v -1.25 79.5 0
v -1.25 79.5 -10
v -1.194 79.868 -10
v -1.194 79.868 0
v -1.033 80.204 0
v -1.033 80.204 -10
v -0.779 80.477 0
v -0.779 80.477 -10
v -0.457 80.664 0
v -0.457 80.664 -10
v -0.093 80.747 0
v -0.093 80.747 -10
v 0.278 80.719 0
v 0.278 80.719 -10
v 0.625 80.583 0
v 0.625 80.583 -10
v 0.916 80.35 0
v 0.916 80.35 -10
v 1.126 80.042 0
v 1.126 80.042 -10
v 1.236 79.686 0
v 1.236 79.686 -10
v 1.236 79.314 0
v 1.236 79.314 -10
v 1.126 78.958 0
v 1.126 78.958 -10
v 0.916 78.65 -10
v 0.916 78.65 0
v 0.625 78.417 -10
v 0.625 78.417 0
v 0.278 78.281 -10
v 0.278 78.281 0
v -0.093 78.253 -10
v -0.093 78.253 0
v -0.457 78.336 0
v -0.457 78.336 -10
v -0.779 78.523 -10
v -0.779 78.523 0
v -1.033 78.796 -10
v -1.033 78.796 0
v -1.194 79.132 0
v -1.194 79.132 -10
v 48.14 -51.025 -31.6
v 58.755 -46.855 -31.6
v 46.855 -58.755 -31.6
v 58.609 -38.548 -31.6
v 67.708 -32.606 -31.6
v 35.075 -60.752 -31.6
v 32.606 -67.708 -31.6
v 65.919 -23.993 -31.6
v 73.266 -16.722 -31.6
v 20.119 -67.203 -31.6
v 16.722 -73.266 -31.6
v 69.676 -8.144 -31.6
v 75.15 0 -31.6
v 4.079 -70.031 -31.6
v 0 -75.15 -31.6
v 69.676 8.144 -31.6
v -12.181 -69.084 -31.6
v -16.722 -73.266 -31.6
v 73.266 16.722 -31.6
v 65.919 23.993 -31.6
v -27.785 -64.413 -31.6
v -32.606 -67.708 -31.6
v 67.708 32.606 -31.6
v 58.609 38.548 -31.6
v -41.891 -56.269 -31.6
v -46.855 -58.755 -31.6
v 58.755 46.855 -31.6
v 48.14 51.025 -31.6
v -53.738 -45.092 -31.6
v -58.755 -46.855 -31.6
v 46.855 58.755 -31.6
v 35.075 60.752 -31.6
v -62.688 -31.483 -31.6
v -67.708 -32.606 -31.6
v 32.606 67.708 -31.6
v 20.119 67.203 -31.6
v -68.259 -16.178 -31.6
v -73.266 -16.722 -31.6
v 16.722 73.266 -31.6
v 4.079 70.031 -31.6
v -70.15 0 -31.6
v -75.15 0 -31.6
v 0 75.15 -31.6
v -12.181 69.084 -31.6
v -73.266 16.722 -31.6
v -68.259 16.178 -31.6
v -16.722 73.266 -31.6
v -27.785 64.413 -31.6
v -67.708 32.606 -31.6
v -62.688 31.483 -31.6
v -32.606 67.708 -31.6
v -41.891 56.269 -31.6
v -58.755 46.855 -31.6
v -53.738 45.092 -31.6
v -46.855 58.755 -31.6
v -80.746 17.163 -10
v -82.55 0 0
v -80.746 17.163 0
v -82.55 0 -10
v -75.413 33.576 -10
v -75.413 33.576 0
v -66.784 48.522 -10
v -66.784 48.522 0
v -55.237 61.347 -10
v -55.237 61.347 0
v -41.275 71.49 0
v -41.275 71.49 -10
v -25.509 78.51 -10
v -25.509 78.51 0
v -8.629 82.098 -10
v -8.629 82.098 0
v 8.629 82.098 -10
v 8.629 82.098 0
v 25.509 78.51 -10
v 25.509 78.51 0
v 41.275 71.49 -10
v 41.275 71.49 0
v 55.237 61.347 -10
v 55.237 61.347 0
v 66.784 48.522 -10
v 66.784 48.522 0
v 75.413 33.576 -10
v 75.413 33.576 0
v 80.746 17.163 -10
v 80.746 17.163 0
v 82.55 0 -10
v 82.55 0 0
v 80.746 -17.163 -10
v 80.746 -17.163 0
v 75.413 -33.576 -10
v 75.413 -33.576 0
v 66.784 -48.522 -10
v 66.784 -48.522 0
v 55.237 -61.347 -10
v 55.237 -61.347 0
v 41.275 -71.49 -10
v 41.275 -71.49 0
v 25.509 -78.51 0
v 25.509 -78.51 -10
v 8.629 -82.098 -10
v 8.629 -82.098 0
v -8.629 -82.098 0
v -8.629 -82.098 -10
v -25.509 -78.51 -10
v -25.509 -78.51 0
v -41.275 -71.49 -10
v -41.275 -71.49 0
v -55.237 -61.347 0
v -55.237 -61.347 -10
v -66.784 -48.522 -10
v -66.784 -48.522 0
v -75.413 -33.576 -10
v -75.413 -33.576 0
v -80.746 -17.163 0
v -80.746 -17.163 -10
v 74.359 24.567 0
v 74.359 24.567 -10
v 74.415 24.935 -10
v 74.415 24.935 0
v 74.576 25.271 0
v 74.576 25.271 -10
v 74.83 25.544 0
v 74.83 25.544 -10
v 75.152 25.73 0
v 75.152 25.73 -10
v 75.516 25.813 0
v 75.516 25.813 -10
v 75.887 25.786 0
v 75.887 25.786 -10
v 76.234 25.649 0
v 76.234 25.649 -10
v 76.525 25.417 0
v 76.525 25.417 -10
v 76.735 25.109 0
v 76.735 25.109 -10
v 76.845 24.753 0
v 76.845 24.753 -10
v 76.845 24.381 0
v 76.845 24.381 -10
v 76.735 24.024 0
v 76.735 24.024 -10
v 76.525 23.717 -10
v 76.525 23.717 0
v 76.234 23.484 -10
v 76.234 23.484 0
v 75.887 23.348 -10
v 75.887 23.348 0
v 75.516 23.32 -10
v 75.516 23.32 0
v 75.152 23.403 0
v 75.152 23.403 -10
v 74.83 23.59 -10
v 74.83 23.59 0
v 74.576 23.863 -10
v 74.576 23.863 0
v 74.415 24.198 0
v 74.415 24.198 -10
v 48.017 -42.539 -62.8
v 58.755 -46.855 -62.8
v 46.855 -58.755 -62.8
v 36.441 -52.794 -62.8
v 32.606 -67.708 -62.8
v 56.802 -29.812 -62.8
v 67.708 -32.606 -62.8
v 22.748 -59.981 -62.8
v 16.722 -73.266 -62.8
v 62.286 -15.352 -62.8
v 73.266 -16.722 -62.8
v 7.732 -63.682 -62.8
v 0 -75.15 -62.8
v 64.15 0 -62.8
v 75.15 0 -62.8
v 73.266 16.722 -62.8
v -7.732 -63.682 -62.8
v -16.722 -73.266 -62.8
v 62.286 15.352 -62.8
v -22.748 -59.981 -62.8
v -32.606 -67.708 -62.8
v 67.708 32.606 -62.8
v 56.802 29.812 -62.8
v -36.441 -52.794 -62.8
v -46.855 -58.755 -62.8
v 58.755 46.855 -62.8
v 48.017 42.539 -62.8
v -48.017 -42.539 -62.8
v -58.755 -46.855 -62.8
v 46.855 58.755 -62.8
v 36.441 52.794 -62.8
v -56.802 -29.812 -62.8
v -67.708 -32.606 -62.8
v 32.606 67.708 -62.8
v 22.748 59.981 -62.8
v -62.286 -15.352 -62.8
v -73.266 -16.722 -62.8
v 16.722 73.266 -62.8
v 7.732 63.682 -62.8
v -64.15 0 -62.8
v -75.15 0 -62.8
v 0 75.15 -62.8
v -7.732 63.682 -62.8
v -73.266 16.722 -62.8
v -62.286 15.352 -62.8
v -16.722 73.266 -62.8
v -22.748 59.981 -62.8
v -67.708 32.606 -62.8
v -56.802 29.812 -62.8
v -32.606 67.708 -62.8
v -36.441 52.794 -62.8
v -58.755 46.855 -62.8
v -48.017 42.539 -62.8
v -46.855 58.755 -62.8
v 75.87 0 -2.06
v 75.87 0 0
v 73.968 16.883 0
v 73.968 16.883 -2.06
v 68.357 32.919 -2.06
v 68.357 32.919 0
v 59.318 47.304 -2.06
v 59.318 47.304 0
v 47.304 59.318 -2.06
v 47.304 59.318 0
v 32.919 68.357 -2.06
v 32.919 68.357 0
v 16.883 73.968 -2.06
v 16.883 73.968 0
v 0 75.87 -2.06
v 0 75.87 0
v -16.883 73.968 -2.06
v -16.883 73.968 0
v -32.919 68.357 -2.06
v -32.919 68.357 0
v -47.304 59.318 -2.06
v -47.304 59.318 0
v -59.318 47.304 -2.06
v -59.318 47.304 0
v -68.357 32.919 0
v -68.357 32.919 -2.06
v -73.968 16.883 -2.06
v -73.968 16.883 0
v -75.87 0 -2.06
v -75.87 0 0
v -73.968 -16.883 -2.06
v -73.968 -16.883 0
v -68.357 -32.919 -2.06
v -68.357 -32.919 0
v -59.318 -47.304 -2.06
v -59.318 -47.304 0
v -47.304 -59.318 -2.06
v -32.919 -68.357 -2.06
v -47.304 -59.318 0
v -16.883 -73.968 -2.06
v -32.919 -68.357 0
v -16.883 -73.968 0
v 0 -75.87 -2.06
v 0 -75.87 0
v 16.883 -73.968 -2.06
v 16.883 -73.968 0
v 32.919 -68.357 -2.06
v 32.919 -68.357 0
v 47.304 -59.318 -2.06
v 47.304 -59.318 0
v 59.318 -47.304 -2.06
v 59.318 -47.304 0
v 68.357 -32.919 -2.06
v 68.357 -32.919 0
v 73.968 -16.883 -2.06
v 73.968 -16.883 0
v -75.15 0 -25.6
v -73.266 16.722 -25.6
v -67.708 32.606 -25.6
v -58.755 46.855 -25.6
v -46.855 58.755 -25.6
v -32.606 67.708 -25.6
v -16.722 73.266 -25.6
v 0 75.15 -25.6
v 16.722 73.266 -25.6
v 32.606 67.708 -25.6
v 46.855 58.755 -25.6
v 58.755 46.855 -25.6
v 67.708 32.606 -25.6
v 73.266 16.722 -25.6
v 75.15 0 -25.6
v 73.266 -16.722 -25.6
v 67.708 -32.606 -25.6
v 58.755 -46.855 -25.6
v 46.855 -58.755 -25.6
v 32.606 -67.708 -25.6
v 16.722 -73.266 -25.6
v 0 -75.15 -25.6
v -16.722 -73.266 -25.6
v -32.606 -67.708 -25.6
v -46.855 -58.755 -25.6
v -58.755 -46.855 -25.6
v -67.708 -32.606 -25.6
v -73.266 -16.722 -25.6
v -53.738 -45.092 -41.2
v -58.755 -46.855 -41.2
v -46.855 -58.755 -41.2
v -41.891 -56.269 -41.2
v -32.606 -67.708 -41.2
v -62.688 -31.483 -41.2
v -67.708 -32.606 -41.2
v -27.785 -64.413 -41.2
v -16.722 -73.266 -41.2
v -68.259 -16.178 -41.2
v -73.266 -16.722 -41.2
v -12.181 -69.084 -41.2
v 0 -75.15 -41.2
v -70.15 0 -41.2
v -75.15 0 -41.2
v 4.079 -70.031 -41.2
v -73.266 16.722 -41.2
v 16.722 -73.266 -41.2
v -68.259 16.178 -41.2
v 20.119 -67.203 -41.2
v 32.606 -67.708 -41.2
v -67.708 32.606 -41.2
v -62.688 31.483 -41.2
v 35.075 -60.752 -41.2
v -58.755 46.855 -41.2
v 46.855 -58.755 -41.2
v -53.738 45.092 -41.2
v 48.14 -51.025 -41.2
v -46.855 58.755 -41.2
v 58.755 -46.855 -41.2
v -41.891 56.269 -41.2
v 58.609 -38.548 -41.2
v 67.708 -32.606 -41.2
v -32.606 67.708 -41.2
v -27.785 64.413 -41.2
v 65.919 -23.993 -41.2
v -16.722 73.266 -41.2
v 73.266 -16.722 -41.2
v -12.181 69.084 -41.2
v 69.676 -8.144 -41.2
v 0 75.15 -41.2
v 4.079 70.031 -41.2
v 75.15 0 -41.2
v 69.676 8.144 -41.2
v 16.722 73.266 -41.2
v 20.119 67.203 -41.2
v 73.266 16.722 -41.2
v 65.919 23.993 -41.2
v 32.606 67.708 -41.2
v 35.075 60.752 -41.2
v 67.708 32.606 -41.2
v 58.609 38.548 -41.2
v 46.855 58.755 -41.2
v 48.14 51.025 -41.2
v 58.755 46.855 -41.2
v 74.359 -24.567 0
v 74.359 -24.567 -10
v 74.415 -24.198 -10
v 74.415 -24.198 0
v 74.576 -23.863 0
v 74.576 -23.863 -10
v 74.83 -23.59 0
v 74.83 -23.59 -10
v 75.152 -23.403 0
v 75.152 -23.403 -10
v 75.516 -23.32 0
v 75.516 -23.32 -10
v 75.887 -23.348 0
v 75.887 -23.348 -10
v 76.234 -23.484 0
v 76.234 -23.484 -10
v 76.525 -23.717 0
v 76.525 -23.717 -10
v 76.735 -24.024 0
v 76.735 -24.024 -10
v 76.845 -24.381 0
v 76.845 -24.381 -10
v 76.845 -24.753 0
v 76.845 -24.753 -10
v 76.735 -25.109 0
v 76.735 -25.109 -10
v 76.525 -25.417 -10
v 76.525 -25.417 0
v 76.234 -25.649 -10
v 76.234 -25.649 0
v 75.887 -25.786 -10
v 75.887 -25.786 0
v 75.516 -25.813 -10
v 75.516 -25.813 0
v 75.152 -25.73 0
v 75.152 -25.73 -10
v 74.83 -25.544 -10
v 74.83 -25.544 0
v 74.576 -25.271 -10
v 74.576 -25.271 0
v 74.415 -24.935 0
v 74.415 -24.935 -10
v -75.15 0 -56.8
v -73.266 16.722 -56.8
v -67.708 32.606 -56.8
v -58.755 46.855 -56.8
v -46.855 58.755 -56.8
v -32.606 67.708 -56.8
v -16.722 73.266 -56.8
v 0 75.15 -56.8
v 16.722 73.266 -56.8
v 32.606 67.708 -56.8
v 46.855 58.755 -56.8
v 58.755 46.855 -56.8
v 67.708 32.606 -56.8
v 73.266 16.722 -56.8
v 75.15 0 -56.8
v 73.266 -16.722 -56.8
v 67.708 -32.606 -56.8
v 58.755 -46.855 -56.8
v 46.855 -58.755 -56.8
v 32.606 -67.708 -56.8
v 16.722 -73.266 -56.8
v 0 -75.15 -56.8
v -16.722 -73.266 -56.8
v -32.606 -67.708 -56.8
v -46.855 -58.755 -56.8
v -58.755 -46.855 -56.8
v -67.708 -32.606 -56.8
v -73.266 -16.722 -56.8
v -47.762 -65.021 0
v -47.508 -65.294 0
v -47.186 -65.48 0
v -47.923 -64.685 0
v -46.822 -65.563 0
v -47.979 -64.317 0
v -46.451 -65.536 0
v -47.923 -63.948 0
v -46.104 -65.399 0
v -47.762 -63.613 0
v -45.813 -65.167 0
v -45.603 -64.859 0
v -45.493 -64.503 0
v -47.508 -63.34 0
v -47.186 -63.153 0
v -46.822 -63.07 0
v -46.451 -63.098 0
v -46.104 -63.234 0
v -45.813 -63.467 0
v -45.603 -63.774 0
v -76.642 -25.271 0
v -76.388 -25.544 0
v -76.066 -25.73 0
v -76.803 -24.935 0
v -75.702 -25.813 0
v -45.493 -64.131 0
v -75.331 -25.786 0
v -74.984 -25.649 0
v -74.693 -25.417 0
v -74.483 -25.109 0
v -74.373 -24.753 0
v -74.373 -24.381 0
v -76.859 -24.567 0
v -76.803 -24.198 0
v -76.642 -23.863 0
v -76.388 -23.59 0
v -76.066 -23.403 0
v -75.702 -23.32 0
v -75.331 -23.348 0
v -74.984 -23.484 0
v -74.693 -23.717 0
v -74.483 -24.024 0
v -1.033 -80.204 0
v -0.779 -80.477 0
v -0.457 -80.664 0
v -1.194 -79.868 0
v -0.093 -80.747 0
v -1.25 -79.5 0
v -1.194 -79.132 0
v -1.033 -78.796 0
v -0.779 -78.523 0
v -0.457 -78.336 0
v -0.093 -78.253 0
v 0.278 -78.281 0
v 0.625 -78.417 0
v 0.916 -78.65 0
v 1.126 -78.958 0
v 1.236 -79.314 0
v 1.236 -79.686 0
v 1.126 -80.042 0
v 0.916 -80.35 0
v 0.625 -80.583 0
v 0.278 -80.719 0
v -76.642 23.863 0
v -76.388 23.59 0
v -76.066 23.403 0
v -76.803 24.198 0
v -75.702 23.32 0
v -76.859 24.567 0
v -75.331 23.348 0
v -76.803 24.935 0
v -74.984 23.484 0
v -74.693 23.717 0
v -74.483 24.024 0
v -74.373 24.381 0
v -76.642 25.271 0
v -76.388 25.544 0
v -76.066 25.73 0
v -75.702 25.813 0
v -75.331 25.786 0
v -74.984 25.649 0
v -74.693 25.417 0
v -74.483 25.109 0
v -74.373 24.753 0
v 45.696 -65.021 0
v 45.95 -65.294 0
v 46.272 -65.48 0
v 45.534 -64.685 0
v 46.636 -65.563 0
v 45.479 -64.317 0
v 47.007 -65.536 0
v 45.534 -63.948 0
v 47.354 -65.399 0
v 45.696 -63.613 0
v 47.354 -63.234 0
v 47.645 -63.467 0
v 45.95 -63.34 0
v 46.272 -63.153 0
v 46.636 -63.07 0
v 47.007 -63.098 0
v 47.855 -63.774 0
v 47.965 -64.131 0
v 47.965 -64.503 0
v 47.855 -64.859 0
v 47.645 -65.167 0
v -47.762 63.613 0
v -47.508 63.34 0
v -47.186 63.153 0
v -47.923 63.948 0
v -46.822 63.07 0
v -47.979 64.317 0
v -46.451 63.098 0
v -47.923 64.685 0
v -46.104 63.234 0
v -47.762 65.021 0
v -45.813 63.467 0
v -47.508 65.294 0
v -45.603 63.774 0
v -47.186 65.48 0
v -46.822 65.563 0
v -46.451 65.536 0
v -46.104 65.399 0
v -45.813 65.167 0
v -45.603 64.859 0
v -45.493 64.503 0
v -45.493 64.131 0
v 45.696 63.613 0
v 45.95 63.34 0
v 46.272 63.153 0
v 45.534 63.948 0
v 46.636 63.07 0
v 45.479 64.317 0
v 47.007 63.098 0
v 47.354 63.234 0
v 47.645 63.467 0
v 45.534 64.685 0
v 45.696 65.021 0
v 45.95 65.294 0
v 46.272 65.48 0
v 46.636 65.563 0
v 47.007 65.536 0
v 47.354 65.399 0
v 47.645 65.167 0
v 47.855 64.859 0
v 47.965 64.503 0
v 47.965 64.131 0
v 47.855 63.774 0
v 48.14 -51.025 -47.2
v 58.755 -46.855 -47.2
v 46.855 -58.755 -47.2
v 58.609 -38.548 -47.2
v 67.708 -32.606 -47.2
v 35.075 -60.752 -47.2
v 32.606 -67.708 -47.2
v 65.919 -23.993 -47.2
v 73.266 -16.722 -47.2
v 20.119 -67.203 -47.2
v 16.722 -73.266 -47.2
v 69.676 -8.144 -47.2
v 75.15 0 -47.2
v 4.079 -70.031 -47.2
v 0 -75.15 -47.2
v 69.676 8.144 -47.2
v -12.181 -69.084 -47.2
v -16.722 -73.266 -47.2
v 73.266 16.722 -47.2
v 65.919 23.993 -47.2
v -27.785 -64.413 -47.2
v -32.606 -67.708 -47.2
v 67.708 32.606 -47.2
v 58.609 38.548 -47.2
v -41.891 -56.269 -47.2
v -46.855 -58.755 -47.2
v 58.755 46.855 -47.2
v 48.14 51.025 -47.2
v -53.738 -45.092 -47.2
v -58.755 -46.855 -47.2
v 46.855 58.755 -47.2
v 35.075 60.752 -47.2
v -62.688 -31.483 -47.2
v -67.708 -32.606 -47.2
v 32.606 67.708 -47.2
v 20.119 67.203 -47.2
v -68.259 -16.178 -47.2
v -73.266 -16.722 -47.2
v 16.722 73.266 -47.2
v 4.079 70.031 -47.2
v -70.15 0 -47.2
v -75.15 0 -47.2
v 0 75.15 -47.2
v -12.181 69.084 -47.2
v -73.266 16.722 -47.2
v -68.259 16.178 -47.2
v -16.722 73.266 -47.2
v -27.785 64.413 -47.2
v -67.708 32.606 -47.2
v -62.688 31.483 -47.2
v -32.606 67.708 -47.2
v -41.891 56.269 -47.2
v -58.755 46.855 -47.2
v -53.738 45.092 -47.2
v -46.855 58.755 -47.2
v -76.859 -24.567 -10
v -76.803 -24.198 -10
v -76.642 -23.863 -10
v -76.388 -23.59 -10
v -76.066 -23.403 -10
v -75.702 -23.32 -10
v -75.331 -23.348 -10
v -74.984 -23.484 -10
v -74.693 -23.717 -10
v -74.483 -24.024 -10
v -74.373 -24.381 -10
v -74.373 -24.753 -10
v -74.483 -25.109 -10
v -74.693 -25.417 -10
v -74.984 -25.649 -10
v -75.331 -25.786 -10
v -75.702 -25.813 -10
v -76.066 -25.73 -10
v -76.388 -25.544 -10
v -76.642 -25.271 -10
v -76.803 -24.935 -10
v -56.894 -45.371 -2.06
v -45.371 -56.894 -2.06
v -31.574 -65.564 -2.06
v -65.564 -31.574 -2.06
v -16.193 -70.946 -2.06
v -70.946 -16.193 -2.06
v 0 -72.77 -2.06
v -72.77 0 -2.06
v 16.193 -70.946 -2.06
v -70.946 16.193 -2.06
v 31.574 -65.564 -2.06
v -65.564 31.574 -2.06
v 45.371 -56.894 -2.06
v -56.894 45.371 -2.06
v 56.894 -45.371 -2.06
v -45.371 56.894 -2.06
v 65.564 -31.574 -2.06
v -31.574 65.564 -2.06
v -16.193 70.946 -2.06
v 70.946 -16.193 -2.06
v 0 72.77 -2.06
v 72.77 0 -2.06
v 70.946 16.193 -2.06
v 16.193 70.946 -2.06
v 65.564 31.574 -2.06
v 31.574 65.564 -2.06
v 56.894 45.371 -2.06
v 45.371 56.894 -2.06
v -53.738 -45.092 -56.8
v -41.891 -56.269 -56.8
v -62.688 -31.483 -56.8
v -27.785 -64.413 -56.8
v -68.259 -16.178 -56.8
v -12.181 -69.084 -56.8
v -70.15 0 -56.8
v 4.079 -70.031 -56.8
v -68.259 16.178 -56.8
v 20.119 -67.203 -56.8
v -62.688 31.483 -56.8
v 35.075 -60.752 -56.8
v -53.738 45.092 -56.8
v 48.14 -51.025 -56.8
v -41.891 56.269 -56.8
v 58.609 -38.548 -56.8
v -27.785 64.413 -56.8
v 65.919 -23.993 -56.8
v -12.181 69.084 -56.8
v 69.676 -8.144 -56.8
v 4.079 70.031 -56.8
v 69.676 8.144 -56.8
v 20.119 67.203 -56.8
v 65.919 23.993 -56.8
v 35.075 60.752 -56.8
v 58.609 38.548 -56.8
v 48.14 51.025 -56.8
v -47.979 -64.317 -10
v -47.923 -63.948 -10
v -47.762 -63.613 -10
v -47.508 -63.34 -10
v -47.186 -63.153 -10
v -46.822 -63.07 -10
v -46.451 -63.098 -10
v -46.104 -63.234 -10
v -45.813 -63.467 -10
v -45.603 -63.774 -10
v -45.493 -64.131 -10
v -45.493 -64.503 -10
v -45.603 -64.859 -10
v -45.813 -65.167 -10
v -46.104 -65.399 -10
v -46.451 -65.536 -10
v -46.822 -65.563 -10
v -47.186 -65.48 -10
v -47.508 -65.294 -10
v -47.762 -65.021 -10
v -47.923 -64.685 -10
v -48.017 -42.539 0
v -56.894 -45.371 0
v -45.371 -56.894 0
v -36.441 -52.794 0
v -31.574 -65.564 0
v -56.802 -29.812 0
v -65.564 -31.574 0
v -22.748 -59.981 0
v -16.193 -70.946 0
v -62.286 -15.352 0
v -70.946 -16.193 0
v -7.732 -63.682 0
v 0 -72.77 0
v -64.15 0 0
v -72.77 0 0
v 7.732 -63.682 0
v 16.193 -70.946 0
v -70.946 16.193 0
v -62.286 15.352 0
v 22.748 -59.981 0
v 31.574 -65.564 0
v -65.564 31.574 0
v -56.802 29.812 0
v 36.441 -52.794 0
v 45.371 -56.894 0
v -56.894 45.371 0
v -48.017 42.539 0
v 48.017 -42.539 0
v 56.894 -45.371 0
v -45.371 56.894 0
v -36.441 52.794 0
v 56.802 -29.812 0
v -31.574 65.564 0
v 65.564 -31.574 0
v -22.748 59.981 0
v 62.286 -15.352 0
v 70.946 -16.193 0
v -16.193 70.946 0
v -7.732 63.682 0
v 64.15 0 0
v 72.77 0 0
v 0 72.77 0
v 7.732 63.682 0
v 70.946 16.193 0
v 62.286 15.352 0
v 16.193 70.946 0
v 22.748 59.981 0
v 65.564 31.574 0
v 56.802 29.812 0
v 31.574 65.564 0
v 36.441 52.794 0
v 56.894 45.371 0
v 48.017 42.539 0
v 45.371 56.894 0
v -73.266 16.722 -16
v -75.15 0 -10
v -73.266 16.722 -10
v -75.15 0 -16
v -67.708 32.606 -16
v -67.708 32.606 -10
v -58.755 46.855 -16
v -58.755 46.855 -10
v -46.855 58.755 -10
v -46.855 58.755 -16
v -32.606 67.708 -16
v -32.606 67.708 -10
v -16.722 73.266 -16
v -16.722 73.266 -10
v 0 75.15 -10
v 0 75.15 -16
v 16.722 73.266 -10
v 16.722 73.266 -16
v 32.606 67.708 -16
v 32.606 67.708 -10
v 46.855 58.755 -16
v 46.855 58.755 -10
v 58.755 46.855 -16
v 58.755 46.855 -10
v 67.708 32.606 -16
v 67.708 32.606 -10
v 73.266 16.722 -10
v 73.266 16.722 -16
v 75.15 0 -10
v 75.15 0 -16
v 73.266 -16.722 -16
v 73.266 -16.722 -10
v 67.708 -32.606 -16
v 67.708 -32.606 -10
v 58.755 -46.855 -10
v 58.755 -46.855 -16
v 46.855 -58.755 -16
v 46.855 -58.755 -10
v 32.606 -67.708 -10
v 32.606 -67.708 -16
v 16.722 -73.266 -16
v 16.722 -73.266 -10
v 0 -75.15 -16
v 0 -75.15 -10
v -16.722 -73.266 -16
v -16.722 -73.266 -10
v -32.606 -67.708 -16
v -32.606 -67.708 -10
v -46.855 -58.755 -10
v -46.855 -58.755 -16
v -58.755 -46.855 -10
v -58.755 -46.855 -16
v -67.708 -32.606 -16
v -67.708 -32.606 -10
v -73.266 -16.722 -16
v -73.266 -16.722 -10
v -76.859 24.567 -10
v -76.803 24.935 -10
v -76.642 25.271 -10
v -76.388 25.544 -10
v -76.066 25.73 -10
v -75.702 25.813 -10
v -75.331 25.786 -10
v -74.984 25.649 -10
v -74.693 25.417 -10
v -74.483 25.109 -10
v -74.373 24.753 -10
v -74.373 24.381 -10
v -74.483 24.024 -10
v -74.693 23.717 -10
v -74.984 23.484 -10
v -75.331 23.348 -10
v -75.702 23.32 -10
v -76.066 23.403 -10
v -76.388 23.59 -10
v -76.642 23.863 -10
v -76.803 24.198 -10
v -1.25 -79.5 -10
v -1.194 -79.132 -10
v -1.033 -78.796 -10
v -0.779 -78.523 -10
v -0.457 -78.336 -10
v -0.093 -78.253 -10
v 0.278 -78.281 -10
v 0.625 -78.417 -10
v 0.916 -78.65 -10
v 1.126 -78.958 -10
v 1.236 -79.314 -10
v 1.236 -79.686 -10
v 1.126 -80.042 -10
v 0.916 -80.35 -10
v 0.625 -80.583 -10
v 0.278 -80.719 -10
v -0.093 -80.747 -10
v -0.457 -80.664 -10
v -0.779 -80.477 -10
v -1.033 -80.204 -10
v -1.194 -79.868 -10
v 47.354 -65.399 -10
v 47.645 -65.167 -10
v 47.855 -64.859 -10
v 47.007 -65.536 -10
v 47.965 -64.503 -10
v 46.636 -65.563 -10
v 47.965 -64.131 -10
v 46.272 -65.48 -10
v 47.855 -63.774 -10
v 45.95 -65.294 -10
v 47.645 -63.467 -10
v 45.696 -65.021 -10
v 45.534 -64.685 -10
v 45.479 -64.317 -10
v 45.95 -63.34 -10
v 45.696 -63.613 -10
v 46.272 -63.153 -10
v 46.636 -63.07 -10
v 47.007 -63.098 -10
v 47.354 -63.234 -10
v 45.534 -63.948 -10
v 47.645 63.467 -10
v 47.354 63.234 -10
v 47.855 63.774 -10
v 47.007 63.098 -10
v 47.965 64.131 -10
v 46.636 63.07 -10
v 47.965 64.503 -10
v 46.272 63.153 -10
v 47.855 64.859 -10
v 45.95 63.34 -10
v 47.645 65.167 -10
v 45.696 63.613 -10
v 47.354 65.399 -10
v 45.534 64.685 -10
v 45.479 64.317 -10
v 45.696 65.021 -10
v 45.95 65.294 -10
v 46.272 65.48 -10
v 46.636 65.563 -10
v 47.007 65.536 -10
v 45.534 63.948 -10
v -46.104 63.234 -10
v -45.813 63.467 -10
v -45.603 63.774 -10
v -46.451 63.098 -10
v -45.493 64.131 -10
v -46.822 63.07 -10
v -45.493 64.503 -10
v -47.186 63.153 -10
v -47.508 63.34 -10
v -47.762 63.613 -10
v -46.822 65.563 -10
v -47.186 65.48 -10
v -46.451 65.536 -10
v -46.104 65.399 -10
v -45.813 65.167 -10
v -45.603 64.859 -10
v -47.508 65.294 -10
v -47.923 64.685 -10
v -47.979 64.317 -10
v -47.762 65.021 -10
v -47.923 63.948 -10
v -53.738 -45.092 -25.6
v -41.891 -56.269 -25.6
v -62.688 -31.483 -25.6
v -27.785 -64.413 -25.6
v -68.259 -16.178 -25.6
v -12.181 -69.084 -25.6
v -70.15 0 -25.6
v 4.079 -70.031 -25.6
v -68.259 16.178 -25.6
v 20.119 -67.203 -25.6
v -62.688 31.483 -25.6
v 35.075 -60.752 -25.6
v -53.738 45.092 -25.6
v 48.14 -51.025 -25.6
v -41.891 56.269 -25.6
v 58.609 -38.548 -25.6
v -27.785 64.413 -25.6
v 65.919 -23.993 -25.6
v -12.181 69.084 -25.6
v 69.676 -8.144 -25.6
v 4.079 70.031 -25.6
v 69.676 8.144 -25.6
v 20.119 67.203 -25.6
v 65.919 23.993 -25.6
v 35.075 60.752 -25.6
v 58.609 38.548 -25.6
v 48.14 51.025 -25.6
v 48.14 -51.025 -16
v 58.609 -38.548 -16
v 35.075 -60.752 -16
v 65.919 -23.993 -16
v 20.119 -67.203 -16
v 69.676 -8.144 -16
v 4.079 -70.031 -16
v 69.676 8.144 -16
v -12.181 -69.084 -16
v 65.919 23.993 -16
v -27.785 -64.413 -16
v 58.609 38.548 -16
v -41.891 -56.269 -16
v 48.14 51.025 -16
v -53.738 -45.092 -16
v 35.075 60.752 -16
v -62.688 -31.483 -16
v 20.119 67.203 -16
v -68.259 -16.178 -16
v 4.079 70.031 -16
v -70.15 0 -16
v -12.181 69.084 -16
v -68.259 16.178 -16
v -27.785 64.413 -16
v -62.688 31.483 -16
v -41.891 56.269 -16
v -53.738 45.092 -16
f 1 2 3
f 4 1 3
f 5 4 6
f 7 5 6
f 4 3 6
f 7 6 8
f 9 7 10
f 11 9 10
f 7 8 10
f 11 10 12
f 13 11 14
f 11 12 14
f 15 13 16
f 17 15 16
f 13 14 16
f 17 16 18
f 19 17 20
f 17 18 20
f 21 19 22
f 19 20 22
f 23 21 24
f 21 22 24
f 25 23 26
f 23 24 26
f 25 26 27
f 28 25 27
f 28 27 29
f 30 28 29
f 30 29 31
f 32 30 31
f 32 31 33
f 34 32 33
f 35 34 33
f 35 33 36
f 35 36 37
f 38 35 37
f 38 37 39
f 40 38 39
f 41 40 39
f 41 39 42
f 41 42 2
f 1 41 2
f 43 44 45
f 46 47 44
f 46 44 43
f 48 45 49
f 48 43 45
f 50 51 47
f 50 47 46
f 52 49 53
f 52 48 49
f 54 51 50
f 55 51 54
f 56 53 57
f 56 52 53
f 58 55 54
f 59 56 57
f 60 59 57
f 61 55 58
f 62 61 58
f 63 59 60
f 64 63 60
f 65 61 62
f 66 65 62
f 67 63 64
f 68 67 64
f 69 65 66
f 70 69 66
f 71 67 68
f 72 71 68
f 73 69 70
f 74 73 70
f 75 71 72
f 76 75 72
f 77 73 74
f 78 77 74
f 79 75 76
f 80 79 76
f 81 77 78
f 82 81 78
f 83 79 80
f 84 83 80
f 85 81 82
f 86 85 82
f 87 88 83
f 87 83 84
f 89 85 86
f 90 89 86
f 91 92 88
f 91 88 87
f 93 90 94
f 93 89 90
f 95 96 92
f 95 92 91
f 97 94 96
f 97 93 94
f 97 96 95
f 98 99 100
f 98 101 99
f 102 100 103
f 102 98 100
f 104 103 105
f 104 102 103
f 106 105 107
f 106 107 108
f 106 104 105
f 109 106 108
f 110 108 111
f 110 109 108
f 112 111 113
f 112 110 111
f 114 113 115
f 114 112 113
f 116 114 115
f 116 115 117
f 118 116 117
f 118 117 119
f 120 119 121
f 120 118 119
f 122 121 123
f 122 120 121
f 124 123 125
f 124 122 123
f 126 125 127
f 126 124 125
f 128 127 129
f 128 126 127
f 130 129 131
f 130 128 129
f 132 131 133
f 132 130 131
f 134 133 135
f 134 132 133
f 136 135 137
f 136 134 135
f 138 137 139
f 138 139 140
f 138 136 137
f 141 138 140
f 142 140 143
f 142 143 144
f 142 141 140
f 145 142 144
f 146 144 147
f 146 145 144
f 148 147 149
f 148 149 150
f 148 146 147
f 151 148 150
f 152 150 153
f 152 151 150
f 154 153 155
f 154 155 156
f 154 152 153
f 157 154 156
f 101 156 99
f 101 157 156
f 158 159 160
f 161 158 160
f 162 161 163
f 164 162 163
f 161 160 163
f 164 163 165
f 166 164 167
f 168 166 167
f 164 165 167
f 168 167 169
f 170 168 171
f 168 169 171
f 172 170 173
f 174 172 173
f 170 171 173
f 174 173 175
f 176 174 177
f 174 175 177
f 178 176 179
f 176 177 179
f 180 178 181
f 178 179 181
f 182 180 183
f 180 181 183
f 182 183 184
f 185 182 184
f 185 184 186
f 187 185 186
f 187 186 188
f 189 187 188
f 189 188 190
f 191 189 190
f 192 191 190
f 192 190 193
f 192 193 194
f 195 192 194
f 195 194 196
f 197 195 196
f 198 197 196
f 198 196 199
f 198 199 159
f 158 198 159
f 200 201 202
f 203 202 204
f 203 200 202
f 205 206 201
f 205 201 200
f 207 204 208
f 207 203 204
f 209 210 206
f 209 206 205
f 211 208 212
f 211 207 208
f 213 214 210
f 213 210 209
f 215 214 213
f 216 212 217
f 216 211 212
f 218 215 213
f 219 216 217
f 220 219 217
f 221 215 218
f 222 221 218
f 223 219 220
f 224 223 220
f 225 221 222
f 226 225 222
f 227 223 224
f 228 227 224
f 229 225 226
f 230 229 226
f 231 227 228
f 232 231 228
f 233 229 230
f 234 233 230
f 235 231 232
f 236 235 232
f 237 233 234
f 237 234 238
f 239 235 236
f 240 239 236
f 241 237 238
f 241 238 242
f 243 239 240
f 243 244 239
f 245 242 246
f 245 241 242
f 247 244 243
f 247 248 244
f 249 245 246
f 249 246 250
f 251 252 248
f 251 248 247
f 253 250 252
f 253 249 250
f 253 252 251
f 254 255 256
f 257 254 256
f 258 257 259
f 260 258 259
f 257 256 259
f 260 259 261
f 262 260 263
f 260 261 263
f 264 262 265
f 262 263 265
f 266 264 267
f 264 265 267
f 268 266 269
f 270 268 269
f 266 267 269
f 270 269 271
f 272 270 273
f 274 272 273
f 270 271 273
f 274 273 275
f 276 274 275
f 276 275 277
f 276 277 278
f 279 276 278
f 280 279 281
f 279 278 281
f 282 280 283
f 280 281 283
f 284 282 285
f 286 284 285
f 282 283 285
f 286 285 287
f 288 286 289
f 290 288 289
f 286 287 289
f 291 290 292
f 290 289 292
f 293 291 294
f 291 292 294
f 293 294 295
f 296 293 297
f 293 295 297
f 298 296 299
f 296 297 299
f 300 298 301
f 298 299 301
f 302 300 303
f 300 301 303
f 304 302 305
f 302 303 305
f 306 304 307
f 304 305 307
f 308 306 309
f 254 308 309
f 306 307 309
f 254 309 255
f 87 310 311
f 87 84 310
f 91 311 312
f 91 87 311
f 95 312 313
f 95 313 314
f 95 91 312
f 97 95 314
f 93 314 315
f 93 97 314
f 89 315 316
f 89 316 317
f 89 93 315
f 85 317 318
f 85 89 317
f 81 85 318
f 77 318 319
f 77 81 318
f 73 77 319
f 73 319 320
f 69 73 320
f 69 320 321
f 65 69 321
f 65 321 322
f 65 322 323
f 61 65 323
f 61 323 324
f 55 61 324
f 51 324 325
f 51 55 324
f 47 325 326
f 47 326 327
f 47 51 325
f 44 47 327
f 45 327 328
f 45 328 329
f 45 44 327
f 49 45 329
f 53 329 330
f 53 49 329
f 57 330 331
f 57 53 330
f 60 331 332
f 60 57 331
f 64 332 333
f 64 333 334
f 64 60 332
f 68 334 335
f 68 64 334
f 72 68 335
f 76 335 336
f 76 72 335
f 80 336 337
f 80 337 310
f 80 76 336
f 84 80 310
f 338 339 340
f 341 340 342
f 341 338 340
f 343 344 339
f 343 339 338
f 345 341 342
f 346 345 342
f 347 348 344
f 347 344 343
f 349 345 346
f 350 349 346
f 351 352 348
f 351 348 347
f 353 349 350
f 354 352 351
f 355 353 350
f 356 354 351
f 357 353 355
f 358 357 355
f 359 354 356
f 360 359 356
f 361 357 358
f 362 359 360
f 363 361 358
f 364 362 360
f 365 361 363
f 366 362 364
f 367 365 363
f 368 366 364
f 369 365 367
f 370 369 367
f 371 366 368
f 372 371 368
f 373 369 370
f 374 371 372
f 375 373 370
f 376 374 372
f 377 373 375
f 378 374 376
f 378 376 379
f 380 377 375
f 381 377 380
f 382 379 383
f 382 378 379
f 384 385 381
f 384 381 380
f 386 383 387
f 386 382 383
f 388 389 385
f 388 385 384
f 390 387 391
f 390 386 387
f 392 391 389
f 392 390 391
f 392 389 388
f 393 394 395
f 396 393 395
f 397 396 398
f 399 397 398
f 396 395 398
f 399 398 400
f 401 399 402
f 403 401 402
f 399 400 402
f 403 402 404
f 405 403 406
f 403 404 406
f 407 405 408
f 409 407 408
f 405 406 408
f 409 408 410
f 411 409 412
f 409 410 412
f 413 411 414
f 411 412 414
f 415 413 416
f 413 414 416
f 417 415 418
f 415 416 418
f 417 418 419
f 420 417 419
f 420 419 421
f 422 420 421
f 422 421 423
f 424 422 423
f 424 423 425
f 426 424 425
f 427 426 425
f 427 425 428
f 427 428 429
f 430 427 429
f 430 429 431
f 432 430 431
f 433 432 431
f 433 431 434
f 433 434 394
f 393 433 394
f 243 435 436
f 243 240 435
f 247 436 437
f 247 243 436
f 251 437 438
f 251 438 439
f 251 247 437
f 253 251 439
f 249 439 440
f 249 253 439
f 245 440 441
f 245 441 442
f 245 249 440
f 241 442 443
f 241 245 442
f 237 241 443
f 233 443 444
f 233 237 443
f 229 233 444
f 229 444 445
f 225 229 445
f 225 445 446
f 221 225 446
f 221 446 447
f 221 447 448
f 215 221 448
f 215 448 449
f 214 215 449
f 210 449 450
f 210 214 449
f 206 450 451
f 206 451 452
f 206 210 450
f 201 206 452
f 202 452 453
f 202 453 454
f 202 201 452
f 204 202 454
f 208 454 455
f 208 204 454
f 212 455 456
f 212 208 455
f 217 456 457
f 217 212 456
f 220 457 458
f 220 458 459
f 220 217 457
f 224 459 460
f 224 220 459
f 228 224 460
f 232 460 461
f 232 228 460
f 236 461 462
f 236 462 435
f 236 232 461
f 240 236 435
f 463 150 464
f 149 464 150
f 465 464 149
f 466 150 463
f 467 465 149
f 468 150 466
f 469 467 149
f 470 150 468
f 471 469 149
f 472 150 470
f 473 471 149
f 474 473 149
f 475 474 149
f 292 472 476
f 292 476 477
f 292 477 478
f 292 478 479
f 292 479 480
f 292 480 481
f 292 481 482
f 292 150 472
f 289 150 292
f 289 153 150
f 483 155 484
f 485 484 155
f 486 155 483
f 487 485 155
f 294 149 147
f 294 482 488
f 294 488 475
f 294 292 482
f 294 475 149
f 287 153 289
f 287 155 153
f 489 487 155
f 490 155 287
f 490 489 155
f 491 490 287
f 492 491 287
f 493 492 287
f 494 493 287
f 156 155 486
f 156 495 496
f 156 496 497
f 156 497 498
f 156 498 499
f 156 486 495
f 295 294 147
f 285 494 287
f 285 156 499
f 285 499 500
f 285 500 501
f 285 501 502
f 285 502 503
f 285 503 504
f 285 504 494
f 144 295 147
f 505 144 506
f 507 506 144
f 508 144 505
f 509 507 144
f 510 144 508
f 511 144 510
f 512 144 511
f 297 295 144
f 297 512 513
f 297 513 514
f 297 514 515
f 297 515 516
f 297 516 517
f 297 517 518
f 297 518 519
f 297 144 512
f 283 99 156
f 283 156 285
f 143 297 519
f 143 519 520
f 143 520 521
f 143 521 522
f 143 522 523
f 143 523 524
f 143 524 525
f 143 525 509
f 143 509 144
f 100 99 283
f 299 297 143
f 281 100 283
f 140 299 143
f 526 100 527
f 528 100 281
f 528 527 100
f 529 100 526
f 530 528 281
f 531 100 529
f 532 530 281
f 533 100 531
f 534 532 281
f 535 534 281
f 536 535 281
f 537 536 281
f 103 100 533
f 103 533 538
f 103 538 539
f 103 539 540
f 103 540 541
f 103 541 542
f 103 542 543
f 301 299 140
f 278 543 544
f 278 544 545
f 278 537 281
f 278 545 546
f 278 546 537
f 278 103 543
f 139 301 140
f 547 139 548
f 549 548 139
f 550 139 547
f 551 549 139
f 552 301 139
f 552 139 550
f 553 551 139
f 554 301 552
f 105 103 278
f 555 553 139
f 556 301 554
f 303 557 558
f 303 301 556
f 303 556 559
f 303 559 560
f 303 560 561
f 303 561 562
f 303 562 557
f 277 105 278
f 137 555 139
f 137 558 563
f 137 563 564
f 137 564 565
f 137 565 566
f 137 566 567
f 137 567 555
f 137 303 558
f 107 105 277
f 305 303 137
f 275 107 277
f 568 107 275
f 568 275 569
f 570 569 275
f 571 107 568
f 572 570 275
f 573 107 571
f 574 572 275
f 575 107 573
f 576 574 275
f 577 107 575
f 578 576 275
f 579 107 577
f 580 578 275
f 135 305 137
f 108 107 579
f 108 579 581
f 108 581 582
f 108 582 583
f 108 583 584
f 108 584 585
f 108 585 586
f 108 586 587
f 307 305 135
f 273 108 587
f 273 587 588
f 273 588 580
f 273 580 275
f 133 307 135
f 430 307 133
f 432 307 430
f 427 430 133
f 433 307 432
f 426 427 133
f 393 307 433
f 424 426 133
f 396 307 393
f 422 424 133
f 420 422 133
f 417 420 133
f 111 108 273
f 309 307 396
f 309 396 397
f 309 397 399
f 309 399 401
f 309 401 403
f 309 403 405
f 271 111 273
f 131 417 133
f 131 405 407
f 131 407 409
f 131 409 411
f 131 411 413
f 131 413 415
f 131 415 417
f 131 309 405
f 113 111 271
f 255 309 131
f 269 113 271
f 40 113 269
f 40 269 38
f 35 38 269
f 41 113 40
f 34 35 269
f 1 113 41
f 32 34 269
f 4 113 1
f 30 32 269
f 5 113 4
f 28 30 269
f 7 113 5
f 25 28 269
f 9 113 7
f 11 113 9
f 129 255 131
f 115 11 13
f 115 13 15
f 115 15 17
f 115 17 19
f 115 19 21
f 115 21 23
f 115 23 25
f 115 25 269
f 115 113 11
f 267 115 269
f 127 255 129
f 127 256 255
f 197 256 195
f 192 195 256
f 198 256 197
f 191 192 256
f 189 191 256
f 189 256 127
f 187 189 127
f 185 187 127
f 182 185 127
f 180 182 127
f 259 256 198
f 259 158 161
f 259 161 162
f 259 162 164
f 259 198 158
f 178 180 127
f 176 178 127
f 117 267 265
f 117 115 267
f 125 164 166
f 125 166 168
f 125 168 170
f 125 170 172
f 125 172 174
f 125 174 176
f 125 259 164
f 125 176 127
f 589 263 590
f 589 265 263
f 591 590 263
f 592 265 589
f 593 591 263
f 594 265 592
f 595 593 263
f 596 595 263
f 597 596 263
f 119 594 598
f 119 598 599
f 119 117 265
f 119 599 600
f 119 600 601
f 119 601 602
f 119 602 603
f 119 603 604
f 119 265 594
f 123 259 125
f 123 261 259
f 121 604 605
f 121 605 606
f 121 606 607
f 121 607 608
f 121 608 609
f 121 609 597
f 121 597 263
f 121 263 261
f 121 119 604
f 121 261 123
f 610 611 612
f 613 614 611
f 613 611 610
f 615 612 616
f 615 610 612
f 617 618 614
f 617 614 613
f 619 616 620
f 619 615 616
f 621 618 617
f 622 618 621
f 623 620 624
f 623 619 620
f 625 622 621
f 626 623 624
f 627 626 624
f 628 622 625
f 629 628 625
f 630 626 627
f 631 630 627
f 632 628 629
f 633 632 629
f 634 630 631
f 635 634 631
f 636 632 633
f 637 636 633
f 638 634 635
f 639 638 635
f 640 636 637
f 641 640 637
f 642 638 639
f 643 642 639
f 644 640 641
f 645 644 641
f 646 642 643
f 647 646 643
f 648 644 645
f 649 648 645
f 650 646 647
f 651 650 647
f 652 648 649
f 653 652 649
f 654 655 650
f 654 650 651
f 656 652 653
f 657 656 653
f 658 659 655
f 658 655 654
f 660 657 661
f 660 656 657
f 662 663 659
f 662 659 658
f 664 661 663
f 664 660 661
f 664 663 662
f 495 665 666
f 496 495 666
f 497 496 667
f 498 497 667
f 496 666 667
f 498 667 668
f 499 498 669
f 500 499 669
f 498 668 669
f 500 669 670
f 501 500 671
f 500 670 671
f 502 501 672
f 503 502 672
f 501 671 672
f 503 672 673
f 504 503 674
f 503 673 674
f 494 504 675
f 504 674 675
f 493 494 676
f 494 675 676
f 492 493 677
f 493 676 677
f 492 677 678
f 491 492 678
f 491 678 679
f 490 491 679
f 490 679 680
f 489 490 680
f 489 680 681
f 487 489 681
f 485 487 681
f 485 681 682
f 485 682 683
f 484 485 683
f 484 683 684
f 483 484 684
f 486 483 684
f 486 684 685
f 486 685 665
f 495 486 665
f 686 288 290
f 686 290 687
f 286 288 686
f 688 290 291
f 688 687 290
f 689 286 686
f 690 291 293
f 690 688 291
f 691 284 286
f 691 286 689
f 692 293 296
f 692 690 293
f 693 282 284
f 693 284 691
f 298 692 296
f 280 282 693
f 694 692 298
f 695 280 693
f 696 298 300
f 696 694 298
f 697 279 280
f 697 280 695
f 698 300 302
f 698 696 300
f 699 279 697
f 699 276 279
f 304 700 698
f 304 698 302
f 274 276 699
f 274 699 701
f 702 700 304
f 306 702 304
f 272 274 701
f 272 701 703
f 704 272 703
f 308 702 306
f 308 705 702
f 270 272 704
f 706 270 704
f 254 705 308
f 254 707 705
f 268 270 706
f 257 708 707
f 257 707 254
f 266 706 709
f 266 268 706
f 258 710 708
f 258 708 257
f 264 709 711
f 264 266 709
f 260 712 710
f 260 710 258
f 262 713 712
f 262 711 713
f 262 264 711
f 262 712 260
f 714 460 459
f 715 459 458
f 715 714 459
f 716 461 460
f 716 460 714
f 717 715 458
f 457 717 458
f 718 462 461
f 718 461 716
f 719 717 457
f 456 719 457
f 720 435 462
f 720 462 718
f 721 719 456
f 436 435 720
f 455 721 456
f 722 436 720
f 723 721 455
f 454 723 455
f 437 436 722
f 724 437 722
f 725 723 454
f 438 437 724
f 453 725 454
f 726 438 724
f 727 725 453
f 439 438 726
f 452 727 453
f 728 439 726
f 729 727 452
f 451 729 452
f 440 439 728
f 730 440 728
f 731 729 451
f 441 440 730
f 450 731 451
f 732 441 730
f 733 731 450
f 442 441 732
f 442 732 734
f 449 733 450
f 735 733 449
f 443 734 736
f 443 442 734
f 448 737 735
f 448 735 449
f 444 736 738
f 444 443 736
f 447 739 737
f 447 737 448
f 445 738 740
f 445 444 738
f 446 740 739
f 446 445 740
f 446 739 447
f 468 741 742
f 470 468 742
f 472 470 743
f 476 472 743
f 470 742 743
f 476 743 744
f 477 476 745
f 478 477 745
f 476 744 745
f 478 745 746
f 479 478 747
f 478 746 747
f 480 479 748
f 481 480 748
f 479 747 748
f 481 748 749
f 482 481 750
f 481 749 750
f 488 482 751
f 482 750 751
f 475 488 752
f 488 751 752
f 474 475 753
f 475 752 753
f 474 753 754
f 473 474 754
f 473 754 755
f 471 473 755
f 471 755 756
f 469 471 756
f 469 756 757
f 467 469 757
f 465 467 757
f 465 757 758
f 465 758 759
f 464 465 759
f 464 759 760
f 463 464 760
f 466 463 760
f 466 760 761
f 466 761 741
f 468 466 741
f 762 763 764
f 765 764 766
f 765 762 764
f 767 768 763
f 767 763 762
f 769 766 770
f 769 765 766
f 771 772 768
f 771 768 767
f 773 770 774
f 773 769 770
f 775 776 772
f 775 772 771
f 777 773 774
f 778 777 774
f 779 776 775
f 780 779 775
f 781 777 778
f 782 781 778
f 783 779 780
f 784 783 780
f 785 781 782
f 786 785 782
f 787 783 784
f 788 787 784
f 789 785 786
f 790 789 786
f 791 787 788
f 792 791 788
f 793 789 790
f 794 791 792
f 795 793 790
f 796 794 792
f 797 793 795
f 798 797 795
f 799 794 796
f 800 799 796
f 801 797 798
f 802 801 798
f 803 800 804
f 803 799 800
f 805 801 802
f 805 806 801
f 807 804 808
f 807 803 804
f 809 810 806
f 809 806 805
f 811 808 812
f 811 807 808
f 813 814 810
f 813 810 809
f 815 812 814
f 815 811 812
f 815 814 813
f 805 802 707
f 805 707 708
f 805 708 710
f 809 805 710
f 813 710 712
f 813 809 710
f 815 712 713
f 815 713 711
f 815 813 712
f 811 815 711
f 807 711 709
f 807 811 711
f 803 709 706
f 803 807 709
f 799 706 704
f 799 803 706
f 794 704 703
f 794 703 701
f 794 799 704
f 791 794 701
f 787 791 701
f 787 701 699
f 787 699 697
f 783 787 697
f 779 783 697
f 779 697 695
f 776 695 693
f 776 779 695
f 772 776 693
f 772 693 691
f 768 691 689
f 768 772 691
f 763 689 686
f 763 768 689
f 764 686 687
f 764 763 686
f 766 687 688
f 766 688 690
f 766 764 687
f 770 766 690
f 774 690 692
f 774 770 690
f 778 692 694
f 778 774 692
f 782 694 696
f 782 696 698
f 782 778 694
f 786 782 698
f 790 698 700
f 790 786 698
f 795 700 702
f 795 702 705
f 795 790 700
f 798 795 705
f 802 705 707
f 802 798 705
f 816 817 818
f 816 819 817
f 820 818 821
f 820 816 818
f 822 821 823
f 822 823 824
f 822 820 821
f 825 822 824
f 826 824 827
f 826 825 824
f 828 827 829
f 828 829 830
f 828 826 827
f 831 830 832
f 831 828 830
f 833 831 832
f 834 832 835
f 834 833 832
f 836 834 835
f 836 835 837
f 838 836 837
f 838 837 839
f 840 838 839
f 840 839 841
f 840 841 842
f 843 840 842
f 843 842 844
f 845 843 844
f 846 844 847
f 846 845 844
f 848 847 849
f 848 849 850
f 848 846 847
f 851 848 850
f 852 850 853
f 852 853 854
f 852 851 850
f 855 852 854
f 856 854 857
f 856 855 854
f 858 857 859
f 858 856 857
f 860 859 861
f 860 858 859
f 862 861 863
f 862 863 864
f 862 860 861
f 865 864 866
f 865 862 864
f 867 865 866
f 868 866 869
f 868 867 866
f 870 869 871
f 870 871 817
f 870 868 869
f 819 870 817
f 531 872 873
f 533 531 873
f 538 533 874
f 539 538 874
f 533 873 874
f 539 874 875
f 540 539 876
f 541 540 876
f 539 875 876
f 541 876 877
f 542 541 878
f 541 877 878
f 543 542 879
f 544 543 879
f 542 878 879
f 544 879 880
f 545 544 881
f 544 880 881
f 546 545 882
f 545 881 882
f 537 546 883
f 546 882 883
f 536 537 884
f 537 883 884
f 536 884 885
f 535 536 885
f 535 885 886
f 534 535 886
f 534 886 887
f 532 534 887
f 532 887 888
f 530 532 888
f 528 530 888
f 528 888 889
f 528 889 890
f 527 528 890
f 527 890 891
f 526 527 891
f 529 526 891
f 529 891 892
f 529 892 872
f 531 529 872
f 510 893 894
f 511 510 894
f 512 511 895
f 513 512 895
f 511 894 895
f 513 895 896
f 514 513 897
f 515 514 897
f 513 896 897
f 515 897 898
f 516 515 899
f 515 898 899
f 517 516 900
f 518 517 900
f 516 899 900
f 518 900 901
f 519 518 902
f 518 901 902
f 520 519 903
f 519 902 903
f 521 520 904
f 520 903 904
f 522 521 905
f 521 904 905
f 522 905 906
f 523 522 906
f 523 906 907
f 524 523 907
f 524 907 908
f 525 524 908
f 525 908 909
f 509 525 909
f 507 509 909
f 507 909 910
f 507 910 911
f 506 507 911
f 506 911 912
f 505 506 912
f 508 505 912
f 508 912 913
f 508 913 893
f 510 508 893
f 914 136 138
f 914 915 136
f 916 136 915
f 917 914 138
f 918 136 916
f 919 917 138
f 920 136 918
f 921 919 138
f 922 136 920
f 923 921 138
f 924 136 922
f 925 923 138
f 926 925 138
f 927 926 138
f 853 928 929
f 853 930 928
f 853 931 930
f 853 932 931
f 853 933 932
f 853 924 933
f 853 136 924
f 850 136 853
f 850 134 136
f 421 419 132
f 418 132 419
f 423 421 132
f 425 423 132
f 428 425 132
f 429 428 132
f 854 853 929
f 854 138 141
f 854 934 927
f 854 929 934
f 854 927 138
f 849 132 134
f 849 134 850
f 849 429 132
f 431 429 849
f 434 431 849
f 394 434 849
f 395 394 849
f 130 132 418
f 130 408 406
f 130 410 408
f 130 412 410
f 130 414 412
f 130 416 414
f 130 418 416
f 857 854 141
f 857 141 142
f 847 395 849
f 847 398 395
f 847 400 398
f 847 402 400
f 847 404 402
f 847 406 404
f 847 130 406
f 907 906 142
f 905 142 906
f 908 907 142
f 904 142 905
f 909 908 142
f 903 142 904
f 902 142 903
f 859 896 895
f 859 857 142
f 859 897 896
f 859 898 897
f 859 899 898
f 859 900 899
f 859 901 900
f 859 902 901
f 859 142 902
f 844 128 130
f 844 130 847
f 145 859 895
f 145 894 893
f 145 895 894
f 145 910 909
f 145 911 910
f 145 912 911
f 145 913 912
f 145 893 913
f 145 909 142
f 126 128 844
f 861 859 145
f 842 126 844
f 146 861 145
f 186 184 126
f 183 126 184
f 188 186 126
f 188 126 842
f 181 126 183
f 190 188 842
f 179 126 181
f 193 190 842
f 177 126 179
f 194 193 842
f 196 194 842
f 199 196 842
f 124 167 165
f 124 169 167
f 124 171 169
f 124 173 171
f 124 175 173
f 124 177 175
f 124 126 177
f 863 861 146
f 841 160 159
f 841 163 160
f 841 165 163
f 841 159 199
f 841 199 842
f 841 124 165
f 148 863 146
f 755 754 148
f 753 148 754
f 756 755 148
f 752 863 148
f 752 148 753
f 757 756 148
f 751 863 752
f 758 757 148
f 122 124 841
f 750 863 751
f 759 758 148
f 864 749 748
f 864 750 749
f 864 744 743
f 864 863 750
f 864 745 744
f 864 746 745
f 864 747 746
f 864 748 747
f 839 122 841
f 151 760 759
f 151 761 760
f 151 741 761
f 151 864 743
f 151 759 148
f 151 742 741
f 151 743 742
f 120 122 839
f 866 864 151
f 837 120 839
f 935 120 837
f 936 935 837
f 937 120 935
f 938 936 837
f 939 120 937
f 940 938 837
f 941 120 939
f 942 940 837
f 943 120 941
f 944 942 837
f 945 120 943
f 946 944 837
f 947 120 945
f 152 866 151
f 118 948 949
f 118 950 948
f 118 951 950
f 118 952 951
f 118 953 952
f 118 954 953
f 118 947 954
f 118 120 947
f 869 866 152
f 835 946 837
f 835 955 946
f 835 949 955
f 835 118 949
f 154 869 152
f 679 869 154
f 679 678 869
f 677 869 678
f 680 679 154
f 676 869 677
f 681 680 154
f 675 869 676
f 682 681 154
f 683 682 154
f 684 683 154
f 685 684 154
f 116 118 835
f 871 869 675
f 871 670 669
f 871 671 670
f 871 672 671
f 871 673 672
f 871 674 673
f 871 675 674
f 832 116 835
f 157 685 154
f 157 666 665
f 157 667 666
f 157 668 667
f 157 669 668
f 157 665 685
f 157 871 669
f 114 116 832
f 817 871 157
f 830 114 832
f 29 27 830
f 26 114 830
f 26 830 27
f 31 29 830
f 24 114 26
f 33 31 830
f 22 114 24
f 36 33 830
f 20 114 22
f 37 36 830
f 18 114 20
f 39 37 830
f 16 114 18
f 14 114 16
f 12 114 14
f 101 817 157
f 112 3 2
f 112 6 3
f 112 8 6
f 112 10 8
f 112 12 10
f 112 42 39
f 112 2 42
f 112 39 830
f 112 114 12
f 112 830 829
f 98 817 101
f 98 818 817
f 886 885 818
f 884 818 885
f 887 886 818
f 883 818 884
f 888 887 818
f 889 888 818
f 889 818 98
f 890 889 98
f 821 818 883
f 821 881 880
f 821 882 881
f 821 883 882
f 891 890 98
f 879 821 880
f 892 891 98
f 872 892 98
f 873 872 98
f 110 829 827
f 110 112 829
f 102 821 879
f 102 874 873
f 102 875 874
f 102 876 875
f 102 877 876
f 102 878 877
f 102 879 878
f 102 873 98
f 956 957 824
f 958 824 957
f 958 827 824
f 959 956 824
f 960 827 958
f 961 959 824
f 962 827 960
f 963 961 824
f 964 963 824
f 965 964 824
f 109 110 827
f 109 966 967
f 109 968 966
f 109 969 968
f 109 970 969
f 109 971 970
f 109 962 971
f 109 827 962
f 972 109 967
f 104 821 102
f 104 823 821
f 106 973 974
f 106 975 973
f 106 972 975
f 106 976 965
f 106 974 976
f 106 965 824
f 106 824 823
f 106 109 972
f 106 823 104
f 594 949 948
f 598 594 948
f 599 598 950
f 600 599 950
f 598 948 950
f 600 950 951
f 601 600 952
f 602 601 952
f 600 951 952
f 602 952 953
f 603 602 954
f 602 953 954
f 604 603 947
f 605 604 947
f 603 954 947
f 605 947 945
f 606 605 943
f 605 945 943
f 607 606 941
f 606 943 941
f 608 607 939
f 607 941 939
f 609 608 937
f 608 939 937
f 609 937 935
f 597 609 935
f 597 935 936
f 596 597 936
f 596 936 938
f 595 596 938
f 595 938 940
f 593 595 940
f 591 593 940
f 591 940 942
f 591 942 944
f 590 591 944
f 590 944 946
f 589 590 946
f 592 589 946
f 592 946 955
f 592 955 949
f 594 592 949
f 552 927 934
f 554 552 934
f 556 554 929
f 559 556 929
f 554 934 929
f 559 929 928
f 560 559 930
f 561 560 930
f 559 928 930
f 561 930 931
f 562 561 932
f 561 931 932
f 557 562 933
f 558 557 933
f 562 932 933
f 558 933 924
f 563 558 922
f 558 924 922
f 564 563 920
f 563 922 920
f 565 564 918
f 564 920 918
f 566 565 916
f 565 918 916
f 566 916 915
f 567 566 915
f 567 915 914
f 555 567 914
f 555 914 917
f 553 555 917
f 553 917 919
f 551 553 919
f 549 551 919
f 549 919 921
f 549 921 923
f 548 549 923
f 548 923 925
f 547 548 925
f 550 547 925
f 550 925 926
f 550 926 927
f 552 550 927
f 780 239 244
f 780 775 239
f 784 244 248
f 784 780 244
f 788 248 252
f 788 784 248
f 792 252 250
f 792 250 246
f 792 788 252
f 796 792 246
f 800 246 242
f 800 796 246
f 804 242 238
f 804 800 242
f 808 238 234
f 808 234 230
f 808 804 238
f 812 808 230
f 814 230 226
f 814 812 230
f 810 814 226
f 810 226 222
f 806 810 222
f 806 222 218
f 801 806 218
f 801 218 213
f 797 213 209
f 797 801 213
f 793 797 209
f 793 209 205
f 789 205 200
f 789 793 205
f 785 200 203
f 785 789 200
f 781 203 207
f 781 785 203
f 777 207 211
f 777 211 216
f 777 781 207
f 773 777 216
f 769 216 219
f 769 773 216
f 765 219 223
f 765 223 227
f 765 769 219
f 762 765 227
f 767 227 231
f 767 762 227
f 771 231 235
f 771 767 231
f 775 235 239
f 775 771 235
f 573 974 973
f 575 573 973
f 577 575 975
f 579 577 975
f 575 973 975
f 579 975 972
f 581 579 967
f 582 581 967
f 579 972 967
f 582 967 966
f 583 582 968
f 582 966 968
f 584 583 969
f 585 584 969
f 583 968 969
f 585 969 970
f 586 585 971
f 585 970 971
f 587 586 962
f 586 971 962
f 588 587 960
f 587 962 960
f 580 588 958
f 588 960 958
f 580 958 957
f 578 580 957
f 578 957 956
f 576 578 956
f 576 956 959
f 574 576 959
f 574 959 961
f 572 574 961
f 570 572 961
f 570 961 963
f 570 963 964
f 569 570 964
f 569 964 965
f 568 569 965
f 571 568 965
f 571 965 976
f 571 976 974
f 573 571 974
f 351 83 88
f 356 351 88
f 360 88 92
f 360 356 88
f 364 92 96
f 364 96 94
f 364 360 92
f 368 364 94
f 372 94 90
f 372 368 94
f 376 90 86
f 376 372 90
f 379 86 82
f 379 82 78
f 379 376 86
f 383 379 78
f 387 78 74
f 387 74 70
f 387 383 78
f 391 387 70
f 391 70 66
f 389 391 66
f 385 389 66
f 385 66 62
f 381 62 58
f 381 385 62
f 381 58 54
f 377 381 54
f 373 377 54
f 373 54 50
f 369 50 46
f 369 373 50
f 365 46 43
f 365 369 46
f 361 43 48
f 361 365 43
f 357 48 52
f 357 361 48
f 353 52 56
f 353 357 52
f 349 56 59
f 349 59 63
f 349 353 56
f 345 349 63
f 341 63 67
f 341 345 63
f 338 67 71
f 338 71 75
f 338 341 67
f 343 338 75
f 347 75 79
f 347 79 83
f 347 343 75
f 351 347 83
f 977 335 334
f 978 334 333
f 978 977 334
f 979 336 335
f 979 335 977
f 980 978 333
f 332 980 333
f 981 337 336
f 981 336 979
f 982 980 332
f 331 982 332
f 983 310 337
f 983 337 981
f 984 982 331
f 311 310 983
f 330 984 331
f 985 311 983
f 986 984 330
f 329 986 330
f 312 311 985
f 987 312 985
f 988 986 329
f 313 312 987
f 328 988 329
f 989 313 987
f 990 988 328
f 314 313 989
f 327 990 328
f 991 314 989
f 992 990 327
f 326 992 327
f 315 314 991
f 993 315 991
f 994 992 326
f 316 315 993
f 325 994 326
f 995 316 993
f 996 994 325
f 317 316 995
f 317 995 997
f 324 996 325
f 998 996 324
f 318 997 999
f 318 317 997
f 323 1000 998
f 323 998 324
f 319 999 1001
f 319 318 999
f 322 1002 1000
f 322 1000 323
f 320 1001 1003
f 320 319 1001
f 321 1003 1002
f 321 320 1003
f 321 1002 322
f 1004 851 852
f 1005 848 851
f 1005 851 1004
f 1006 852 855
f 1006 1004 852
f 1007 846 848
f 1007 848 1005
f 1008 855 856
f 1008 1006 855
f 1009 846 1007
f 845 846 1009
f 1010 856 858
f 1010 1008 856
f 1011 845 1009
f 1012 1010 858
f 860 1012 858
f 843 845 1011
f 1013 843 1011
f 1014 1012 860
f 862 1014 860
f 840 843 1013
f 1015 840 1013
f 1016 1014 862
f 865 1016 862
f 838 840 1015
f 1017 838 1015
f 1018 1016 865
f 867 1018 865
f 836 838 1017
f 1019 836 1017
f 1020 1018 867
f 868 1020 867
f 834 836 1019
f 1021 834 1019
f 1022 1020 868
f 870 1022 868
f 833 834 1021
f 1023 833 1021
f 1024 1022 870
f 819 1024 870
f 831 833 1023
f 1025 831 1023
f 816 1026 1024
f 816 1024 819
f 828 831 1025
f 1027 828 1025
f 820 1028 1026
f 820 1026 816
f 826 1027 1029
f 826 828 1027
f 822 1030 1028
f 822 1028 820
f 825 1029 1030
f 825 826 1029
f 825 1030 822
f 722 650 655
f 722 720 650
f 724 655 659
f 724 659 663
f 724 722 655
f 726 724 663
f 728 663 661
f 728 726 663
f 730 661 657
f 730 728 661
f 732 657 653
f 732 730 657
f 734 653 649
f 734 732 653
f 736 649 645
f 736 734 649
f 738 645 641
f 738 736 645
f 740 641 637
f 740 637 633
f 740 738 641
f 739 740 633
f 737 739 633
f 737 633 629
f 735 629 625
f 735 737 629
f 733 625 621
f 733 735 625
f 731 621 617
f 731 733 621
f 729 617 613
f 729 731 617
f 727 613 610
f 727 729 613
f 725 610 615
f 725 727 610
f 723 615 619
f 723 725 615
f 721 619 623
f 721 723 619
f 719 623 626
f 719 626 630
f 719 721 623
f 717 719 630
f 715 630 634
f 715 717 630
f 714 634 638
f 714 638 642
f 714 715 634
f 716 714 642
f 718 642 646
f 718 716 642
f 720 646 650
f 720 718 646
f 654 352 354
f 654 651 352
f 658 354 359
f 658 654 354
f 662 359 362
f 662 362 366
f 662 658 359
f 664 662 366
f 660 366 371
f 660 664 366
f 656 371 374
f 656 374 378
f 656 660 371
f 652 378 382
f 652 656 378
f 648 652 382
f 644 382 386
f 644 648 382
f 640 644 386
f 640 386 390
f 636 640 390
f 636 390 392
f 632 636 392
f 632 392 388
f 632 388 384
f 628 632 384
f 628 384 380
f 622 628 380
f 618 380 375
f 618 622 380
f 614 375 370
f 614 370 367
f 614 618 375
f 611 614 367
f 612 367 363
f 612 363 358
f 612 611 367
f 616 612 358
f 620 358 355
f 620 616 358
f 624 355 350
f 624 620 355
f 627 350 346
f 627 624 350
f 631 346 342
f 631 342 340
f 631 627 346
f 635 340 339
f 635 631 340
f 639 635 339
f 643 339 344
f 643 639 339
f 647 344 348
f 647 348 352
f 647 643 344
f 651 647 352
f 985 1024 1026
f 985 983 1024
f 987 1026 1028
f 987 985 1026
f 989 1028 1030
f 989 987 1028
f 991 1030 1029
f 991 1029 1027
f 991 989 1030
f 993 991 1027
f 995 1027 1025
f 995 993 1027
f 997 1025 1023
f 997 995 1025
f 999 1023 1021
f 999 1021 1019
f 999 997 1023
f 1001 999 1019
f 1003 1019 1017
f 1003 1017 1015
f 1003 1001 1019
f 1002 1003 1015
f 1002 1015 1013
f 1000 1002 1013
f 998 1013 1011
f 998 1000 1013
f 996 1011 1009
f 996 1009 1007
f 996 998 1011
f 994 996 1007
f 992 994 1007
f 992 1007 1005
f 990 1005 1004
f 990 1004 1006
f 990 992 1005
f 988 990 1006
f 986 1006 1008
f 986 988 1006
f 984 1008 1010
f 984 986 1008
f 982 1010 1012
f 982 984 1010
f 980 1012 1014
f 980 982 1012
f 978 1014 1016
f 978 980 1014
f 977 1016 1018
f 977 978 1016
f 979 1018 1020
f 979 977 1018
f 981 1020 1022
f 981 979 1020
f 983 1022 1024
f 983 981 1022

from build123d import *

# Parameters (mm, degrees)
M3X0_5_TAPPED_HOLE1_D = 2.5
SKETCH5_R             = 75.87
SKETCH5_R_2           = 72.77
CUT_EXTRUDE1_DEPTH    = 2.06


with BuildPart() as part:
    # Sketch1 → Revolve1 (revolve)
    with BuildSketch(Plane(origin=(0, 0, 0), x_dir=(1, 0, 0), z_dir=(0, 1, 0))):
        Polygon((-82.55, 0), (-82.55, 10), (-75.15, 10), (-75.15, 16), (-70.15, 16), (-70.15, 25.6), (-75.15, 25.6), (-75.15, 31.6), (-70.15, 31.6), (-70.15, 41.2), (-75.15, 41.2), (-75.15, 47.2), (-70.15, 47.2), (-70.15, 56.8), (-75.15, 56.8), (-75.15, 62.8), (-64.15, 62.8), (-64.15, 0), align=None)
    revolve(axis=Axis((0, 0, 0), (0, 0, -1)))

    # M3x0.5 Tapped Hole1 (through all)
    with Locations(Plane.XY):
        with Locations((0, 79.5), (46.728927557, 64.316851053), (75.608993045, 24.566851053), (75.608993045, -24.566851053), (46.728927557, -64.316851053), (0, -79.5), (-46.728927557, -64.316851053), (-75.608993045, -24.566851053), (-75.608993045, 24.566851053), (-46.728927557, 64.316851053)):
            Hole(M3X0_5_TAPPED_HOLE1_D / 2)

    # Sketch5 → Cut-Extrude1 (cut)
    with BuildSketch(Plane.XY):
        Circle(SKETCH5_R)
        Circle(SKETCH5_R_2, mode=Mode.SUBTRACT)
    extrude(amount=-CUT_EXTRUDE1_DEPTH, mode=Mode.SUBTRACT)


solid = part.part
